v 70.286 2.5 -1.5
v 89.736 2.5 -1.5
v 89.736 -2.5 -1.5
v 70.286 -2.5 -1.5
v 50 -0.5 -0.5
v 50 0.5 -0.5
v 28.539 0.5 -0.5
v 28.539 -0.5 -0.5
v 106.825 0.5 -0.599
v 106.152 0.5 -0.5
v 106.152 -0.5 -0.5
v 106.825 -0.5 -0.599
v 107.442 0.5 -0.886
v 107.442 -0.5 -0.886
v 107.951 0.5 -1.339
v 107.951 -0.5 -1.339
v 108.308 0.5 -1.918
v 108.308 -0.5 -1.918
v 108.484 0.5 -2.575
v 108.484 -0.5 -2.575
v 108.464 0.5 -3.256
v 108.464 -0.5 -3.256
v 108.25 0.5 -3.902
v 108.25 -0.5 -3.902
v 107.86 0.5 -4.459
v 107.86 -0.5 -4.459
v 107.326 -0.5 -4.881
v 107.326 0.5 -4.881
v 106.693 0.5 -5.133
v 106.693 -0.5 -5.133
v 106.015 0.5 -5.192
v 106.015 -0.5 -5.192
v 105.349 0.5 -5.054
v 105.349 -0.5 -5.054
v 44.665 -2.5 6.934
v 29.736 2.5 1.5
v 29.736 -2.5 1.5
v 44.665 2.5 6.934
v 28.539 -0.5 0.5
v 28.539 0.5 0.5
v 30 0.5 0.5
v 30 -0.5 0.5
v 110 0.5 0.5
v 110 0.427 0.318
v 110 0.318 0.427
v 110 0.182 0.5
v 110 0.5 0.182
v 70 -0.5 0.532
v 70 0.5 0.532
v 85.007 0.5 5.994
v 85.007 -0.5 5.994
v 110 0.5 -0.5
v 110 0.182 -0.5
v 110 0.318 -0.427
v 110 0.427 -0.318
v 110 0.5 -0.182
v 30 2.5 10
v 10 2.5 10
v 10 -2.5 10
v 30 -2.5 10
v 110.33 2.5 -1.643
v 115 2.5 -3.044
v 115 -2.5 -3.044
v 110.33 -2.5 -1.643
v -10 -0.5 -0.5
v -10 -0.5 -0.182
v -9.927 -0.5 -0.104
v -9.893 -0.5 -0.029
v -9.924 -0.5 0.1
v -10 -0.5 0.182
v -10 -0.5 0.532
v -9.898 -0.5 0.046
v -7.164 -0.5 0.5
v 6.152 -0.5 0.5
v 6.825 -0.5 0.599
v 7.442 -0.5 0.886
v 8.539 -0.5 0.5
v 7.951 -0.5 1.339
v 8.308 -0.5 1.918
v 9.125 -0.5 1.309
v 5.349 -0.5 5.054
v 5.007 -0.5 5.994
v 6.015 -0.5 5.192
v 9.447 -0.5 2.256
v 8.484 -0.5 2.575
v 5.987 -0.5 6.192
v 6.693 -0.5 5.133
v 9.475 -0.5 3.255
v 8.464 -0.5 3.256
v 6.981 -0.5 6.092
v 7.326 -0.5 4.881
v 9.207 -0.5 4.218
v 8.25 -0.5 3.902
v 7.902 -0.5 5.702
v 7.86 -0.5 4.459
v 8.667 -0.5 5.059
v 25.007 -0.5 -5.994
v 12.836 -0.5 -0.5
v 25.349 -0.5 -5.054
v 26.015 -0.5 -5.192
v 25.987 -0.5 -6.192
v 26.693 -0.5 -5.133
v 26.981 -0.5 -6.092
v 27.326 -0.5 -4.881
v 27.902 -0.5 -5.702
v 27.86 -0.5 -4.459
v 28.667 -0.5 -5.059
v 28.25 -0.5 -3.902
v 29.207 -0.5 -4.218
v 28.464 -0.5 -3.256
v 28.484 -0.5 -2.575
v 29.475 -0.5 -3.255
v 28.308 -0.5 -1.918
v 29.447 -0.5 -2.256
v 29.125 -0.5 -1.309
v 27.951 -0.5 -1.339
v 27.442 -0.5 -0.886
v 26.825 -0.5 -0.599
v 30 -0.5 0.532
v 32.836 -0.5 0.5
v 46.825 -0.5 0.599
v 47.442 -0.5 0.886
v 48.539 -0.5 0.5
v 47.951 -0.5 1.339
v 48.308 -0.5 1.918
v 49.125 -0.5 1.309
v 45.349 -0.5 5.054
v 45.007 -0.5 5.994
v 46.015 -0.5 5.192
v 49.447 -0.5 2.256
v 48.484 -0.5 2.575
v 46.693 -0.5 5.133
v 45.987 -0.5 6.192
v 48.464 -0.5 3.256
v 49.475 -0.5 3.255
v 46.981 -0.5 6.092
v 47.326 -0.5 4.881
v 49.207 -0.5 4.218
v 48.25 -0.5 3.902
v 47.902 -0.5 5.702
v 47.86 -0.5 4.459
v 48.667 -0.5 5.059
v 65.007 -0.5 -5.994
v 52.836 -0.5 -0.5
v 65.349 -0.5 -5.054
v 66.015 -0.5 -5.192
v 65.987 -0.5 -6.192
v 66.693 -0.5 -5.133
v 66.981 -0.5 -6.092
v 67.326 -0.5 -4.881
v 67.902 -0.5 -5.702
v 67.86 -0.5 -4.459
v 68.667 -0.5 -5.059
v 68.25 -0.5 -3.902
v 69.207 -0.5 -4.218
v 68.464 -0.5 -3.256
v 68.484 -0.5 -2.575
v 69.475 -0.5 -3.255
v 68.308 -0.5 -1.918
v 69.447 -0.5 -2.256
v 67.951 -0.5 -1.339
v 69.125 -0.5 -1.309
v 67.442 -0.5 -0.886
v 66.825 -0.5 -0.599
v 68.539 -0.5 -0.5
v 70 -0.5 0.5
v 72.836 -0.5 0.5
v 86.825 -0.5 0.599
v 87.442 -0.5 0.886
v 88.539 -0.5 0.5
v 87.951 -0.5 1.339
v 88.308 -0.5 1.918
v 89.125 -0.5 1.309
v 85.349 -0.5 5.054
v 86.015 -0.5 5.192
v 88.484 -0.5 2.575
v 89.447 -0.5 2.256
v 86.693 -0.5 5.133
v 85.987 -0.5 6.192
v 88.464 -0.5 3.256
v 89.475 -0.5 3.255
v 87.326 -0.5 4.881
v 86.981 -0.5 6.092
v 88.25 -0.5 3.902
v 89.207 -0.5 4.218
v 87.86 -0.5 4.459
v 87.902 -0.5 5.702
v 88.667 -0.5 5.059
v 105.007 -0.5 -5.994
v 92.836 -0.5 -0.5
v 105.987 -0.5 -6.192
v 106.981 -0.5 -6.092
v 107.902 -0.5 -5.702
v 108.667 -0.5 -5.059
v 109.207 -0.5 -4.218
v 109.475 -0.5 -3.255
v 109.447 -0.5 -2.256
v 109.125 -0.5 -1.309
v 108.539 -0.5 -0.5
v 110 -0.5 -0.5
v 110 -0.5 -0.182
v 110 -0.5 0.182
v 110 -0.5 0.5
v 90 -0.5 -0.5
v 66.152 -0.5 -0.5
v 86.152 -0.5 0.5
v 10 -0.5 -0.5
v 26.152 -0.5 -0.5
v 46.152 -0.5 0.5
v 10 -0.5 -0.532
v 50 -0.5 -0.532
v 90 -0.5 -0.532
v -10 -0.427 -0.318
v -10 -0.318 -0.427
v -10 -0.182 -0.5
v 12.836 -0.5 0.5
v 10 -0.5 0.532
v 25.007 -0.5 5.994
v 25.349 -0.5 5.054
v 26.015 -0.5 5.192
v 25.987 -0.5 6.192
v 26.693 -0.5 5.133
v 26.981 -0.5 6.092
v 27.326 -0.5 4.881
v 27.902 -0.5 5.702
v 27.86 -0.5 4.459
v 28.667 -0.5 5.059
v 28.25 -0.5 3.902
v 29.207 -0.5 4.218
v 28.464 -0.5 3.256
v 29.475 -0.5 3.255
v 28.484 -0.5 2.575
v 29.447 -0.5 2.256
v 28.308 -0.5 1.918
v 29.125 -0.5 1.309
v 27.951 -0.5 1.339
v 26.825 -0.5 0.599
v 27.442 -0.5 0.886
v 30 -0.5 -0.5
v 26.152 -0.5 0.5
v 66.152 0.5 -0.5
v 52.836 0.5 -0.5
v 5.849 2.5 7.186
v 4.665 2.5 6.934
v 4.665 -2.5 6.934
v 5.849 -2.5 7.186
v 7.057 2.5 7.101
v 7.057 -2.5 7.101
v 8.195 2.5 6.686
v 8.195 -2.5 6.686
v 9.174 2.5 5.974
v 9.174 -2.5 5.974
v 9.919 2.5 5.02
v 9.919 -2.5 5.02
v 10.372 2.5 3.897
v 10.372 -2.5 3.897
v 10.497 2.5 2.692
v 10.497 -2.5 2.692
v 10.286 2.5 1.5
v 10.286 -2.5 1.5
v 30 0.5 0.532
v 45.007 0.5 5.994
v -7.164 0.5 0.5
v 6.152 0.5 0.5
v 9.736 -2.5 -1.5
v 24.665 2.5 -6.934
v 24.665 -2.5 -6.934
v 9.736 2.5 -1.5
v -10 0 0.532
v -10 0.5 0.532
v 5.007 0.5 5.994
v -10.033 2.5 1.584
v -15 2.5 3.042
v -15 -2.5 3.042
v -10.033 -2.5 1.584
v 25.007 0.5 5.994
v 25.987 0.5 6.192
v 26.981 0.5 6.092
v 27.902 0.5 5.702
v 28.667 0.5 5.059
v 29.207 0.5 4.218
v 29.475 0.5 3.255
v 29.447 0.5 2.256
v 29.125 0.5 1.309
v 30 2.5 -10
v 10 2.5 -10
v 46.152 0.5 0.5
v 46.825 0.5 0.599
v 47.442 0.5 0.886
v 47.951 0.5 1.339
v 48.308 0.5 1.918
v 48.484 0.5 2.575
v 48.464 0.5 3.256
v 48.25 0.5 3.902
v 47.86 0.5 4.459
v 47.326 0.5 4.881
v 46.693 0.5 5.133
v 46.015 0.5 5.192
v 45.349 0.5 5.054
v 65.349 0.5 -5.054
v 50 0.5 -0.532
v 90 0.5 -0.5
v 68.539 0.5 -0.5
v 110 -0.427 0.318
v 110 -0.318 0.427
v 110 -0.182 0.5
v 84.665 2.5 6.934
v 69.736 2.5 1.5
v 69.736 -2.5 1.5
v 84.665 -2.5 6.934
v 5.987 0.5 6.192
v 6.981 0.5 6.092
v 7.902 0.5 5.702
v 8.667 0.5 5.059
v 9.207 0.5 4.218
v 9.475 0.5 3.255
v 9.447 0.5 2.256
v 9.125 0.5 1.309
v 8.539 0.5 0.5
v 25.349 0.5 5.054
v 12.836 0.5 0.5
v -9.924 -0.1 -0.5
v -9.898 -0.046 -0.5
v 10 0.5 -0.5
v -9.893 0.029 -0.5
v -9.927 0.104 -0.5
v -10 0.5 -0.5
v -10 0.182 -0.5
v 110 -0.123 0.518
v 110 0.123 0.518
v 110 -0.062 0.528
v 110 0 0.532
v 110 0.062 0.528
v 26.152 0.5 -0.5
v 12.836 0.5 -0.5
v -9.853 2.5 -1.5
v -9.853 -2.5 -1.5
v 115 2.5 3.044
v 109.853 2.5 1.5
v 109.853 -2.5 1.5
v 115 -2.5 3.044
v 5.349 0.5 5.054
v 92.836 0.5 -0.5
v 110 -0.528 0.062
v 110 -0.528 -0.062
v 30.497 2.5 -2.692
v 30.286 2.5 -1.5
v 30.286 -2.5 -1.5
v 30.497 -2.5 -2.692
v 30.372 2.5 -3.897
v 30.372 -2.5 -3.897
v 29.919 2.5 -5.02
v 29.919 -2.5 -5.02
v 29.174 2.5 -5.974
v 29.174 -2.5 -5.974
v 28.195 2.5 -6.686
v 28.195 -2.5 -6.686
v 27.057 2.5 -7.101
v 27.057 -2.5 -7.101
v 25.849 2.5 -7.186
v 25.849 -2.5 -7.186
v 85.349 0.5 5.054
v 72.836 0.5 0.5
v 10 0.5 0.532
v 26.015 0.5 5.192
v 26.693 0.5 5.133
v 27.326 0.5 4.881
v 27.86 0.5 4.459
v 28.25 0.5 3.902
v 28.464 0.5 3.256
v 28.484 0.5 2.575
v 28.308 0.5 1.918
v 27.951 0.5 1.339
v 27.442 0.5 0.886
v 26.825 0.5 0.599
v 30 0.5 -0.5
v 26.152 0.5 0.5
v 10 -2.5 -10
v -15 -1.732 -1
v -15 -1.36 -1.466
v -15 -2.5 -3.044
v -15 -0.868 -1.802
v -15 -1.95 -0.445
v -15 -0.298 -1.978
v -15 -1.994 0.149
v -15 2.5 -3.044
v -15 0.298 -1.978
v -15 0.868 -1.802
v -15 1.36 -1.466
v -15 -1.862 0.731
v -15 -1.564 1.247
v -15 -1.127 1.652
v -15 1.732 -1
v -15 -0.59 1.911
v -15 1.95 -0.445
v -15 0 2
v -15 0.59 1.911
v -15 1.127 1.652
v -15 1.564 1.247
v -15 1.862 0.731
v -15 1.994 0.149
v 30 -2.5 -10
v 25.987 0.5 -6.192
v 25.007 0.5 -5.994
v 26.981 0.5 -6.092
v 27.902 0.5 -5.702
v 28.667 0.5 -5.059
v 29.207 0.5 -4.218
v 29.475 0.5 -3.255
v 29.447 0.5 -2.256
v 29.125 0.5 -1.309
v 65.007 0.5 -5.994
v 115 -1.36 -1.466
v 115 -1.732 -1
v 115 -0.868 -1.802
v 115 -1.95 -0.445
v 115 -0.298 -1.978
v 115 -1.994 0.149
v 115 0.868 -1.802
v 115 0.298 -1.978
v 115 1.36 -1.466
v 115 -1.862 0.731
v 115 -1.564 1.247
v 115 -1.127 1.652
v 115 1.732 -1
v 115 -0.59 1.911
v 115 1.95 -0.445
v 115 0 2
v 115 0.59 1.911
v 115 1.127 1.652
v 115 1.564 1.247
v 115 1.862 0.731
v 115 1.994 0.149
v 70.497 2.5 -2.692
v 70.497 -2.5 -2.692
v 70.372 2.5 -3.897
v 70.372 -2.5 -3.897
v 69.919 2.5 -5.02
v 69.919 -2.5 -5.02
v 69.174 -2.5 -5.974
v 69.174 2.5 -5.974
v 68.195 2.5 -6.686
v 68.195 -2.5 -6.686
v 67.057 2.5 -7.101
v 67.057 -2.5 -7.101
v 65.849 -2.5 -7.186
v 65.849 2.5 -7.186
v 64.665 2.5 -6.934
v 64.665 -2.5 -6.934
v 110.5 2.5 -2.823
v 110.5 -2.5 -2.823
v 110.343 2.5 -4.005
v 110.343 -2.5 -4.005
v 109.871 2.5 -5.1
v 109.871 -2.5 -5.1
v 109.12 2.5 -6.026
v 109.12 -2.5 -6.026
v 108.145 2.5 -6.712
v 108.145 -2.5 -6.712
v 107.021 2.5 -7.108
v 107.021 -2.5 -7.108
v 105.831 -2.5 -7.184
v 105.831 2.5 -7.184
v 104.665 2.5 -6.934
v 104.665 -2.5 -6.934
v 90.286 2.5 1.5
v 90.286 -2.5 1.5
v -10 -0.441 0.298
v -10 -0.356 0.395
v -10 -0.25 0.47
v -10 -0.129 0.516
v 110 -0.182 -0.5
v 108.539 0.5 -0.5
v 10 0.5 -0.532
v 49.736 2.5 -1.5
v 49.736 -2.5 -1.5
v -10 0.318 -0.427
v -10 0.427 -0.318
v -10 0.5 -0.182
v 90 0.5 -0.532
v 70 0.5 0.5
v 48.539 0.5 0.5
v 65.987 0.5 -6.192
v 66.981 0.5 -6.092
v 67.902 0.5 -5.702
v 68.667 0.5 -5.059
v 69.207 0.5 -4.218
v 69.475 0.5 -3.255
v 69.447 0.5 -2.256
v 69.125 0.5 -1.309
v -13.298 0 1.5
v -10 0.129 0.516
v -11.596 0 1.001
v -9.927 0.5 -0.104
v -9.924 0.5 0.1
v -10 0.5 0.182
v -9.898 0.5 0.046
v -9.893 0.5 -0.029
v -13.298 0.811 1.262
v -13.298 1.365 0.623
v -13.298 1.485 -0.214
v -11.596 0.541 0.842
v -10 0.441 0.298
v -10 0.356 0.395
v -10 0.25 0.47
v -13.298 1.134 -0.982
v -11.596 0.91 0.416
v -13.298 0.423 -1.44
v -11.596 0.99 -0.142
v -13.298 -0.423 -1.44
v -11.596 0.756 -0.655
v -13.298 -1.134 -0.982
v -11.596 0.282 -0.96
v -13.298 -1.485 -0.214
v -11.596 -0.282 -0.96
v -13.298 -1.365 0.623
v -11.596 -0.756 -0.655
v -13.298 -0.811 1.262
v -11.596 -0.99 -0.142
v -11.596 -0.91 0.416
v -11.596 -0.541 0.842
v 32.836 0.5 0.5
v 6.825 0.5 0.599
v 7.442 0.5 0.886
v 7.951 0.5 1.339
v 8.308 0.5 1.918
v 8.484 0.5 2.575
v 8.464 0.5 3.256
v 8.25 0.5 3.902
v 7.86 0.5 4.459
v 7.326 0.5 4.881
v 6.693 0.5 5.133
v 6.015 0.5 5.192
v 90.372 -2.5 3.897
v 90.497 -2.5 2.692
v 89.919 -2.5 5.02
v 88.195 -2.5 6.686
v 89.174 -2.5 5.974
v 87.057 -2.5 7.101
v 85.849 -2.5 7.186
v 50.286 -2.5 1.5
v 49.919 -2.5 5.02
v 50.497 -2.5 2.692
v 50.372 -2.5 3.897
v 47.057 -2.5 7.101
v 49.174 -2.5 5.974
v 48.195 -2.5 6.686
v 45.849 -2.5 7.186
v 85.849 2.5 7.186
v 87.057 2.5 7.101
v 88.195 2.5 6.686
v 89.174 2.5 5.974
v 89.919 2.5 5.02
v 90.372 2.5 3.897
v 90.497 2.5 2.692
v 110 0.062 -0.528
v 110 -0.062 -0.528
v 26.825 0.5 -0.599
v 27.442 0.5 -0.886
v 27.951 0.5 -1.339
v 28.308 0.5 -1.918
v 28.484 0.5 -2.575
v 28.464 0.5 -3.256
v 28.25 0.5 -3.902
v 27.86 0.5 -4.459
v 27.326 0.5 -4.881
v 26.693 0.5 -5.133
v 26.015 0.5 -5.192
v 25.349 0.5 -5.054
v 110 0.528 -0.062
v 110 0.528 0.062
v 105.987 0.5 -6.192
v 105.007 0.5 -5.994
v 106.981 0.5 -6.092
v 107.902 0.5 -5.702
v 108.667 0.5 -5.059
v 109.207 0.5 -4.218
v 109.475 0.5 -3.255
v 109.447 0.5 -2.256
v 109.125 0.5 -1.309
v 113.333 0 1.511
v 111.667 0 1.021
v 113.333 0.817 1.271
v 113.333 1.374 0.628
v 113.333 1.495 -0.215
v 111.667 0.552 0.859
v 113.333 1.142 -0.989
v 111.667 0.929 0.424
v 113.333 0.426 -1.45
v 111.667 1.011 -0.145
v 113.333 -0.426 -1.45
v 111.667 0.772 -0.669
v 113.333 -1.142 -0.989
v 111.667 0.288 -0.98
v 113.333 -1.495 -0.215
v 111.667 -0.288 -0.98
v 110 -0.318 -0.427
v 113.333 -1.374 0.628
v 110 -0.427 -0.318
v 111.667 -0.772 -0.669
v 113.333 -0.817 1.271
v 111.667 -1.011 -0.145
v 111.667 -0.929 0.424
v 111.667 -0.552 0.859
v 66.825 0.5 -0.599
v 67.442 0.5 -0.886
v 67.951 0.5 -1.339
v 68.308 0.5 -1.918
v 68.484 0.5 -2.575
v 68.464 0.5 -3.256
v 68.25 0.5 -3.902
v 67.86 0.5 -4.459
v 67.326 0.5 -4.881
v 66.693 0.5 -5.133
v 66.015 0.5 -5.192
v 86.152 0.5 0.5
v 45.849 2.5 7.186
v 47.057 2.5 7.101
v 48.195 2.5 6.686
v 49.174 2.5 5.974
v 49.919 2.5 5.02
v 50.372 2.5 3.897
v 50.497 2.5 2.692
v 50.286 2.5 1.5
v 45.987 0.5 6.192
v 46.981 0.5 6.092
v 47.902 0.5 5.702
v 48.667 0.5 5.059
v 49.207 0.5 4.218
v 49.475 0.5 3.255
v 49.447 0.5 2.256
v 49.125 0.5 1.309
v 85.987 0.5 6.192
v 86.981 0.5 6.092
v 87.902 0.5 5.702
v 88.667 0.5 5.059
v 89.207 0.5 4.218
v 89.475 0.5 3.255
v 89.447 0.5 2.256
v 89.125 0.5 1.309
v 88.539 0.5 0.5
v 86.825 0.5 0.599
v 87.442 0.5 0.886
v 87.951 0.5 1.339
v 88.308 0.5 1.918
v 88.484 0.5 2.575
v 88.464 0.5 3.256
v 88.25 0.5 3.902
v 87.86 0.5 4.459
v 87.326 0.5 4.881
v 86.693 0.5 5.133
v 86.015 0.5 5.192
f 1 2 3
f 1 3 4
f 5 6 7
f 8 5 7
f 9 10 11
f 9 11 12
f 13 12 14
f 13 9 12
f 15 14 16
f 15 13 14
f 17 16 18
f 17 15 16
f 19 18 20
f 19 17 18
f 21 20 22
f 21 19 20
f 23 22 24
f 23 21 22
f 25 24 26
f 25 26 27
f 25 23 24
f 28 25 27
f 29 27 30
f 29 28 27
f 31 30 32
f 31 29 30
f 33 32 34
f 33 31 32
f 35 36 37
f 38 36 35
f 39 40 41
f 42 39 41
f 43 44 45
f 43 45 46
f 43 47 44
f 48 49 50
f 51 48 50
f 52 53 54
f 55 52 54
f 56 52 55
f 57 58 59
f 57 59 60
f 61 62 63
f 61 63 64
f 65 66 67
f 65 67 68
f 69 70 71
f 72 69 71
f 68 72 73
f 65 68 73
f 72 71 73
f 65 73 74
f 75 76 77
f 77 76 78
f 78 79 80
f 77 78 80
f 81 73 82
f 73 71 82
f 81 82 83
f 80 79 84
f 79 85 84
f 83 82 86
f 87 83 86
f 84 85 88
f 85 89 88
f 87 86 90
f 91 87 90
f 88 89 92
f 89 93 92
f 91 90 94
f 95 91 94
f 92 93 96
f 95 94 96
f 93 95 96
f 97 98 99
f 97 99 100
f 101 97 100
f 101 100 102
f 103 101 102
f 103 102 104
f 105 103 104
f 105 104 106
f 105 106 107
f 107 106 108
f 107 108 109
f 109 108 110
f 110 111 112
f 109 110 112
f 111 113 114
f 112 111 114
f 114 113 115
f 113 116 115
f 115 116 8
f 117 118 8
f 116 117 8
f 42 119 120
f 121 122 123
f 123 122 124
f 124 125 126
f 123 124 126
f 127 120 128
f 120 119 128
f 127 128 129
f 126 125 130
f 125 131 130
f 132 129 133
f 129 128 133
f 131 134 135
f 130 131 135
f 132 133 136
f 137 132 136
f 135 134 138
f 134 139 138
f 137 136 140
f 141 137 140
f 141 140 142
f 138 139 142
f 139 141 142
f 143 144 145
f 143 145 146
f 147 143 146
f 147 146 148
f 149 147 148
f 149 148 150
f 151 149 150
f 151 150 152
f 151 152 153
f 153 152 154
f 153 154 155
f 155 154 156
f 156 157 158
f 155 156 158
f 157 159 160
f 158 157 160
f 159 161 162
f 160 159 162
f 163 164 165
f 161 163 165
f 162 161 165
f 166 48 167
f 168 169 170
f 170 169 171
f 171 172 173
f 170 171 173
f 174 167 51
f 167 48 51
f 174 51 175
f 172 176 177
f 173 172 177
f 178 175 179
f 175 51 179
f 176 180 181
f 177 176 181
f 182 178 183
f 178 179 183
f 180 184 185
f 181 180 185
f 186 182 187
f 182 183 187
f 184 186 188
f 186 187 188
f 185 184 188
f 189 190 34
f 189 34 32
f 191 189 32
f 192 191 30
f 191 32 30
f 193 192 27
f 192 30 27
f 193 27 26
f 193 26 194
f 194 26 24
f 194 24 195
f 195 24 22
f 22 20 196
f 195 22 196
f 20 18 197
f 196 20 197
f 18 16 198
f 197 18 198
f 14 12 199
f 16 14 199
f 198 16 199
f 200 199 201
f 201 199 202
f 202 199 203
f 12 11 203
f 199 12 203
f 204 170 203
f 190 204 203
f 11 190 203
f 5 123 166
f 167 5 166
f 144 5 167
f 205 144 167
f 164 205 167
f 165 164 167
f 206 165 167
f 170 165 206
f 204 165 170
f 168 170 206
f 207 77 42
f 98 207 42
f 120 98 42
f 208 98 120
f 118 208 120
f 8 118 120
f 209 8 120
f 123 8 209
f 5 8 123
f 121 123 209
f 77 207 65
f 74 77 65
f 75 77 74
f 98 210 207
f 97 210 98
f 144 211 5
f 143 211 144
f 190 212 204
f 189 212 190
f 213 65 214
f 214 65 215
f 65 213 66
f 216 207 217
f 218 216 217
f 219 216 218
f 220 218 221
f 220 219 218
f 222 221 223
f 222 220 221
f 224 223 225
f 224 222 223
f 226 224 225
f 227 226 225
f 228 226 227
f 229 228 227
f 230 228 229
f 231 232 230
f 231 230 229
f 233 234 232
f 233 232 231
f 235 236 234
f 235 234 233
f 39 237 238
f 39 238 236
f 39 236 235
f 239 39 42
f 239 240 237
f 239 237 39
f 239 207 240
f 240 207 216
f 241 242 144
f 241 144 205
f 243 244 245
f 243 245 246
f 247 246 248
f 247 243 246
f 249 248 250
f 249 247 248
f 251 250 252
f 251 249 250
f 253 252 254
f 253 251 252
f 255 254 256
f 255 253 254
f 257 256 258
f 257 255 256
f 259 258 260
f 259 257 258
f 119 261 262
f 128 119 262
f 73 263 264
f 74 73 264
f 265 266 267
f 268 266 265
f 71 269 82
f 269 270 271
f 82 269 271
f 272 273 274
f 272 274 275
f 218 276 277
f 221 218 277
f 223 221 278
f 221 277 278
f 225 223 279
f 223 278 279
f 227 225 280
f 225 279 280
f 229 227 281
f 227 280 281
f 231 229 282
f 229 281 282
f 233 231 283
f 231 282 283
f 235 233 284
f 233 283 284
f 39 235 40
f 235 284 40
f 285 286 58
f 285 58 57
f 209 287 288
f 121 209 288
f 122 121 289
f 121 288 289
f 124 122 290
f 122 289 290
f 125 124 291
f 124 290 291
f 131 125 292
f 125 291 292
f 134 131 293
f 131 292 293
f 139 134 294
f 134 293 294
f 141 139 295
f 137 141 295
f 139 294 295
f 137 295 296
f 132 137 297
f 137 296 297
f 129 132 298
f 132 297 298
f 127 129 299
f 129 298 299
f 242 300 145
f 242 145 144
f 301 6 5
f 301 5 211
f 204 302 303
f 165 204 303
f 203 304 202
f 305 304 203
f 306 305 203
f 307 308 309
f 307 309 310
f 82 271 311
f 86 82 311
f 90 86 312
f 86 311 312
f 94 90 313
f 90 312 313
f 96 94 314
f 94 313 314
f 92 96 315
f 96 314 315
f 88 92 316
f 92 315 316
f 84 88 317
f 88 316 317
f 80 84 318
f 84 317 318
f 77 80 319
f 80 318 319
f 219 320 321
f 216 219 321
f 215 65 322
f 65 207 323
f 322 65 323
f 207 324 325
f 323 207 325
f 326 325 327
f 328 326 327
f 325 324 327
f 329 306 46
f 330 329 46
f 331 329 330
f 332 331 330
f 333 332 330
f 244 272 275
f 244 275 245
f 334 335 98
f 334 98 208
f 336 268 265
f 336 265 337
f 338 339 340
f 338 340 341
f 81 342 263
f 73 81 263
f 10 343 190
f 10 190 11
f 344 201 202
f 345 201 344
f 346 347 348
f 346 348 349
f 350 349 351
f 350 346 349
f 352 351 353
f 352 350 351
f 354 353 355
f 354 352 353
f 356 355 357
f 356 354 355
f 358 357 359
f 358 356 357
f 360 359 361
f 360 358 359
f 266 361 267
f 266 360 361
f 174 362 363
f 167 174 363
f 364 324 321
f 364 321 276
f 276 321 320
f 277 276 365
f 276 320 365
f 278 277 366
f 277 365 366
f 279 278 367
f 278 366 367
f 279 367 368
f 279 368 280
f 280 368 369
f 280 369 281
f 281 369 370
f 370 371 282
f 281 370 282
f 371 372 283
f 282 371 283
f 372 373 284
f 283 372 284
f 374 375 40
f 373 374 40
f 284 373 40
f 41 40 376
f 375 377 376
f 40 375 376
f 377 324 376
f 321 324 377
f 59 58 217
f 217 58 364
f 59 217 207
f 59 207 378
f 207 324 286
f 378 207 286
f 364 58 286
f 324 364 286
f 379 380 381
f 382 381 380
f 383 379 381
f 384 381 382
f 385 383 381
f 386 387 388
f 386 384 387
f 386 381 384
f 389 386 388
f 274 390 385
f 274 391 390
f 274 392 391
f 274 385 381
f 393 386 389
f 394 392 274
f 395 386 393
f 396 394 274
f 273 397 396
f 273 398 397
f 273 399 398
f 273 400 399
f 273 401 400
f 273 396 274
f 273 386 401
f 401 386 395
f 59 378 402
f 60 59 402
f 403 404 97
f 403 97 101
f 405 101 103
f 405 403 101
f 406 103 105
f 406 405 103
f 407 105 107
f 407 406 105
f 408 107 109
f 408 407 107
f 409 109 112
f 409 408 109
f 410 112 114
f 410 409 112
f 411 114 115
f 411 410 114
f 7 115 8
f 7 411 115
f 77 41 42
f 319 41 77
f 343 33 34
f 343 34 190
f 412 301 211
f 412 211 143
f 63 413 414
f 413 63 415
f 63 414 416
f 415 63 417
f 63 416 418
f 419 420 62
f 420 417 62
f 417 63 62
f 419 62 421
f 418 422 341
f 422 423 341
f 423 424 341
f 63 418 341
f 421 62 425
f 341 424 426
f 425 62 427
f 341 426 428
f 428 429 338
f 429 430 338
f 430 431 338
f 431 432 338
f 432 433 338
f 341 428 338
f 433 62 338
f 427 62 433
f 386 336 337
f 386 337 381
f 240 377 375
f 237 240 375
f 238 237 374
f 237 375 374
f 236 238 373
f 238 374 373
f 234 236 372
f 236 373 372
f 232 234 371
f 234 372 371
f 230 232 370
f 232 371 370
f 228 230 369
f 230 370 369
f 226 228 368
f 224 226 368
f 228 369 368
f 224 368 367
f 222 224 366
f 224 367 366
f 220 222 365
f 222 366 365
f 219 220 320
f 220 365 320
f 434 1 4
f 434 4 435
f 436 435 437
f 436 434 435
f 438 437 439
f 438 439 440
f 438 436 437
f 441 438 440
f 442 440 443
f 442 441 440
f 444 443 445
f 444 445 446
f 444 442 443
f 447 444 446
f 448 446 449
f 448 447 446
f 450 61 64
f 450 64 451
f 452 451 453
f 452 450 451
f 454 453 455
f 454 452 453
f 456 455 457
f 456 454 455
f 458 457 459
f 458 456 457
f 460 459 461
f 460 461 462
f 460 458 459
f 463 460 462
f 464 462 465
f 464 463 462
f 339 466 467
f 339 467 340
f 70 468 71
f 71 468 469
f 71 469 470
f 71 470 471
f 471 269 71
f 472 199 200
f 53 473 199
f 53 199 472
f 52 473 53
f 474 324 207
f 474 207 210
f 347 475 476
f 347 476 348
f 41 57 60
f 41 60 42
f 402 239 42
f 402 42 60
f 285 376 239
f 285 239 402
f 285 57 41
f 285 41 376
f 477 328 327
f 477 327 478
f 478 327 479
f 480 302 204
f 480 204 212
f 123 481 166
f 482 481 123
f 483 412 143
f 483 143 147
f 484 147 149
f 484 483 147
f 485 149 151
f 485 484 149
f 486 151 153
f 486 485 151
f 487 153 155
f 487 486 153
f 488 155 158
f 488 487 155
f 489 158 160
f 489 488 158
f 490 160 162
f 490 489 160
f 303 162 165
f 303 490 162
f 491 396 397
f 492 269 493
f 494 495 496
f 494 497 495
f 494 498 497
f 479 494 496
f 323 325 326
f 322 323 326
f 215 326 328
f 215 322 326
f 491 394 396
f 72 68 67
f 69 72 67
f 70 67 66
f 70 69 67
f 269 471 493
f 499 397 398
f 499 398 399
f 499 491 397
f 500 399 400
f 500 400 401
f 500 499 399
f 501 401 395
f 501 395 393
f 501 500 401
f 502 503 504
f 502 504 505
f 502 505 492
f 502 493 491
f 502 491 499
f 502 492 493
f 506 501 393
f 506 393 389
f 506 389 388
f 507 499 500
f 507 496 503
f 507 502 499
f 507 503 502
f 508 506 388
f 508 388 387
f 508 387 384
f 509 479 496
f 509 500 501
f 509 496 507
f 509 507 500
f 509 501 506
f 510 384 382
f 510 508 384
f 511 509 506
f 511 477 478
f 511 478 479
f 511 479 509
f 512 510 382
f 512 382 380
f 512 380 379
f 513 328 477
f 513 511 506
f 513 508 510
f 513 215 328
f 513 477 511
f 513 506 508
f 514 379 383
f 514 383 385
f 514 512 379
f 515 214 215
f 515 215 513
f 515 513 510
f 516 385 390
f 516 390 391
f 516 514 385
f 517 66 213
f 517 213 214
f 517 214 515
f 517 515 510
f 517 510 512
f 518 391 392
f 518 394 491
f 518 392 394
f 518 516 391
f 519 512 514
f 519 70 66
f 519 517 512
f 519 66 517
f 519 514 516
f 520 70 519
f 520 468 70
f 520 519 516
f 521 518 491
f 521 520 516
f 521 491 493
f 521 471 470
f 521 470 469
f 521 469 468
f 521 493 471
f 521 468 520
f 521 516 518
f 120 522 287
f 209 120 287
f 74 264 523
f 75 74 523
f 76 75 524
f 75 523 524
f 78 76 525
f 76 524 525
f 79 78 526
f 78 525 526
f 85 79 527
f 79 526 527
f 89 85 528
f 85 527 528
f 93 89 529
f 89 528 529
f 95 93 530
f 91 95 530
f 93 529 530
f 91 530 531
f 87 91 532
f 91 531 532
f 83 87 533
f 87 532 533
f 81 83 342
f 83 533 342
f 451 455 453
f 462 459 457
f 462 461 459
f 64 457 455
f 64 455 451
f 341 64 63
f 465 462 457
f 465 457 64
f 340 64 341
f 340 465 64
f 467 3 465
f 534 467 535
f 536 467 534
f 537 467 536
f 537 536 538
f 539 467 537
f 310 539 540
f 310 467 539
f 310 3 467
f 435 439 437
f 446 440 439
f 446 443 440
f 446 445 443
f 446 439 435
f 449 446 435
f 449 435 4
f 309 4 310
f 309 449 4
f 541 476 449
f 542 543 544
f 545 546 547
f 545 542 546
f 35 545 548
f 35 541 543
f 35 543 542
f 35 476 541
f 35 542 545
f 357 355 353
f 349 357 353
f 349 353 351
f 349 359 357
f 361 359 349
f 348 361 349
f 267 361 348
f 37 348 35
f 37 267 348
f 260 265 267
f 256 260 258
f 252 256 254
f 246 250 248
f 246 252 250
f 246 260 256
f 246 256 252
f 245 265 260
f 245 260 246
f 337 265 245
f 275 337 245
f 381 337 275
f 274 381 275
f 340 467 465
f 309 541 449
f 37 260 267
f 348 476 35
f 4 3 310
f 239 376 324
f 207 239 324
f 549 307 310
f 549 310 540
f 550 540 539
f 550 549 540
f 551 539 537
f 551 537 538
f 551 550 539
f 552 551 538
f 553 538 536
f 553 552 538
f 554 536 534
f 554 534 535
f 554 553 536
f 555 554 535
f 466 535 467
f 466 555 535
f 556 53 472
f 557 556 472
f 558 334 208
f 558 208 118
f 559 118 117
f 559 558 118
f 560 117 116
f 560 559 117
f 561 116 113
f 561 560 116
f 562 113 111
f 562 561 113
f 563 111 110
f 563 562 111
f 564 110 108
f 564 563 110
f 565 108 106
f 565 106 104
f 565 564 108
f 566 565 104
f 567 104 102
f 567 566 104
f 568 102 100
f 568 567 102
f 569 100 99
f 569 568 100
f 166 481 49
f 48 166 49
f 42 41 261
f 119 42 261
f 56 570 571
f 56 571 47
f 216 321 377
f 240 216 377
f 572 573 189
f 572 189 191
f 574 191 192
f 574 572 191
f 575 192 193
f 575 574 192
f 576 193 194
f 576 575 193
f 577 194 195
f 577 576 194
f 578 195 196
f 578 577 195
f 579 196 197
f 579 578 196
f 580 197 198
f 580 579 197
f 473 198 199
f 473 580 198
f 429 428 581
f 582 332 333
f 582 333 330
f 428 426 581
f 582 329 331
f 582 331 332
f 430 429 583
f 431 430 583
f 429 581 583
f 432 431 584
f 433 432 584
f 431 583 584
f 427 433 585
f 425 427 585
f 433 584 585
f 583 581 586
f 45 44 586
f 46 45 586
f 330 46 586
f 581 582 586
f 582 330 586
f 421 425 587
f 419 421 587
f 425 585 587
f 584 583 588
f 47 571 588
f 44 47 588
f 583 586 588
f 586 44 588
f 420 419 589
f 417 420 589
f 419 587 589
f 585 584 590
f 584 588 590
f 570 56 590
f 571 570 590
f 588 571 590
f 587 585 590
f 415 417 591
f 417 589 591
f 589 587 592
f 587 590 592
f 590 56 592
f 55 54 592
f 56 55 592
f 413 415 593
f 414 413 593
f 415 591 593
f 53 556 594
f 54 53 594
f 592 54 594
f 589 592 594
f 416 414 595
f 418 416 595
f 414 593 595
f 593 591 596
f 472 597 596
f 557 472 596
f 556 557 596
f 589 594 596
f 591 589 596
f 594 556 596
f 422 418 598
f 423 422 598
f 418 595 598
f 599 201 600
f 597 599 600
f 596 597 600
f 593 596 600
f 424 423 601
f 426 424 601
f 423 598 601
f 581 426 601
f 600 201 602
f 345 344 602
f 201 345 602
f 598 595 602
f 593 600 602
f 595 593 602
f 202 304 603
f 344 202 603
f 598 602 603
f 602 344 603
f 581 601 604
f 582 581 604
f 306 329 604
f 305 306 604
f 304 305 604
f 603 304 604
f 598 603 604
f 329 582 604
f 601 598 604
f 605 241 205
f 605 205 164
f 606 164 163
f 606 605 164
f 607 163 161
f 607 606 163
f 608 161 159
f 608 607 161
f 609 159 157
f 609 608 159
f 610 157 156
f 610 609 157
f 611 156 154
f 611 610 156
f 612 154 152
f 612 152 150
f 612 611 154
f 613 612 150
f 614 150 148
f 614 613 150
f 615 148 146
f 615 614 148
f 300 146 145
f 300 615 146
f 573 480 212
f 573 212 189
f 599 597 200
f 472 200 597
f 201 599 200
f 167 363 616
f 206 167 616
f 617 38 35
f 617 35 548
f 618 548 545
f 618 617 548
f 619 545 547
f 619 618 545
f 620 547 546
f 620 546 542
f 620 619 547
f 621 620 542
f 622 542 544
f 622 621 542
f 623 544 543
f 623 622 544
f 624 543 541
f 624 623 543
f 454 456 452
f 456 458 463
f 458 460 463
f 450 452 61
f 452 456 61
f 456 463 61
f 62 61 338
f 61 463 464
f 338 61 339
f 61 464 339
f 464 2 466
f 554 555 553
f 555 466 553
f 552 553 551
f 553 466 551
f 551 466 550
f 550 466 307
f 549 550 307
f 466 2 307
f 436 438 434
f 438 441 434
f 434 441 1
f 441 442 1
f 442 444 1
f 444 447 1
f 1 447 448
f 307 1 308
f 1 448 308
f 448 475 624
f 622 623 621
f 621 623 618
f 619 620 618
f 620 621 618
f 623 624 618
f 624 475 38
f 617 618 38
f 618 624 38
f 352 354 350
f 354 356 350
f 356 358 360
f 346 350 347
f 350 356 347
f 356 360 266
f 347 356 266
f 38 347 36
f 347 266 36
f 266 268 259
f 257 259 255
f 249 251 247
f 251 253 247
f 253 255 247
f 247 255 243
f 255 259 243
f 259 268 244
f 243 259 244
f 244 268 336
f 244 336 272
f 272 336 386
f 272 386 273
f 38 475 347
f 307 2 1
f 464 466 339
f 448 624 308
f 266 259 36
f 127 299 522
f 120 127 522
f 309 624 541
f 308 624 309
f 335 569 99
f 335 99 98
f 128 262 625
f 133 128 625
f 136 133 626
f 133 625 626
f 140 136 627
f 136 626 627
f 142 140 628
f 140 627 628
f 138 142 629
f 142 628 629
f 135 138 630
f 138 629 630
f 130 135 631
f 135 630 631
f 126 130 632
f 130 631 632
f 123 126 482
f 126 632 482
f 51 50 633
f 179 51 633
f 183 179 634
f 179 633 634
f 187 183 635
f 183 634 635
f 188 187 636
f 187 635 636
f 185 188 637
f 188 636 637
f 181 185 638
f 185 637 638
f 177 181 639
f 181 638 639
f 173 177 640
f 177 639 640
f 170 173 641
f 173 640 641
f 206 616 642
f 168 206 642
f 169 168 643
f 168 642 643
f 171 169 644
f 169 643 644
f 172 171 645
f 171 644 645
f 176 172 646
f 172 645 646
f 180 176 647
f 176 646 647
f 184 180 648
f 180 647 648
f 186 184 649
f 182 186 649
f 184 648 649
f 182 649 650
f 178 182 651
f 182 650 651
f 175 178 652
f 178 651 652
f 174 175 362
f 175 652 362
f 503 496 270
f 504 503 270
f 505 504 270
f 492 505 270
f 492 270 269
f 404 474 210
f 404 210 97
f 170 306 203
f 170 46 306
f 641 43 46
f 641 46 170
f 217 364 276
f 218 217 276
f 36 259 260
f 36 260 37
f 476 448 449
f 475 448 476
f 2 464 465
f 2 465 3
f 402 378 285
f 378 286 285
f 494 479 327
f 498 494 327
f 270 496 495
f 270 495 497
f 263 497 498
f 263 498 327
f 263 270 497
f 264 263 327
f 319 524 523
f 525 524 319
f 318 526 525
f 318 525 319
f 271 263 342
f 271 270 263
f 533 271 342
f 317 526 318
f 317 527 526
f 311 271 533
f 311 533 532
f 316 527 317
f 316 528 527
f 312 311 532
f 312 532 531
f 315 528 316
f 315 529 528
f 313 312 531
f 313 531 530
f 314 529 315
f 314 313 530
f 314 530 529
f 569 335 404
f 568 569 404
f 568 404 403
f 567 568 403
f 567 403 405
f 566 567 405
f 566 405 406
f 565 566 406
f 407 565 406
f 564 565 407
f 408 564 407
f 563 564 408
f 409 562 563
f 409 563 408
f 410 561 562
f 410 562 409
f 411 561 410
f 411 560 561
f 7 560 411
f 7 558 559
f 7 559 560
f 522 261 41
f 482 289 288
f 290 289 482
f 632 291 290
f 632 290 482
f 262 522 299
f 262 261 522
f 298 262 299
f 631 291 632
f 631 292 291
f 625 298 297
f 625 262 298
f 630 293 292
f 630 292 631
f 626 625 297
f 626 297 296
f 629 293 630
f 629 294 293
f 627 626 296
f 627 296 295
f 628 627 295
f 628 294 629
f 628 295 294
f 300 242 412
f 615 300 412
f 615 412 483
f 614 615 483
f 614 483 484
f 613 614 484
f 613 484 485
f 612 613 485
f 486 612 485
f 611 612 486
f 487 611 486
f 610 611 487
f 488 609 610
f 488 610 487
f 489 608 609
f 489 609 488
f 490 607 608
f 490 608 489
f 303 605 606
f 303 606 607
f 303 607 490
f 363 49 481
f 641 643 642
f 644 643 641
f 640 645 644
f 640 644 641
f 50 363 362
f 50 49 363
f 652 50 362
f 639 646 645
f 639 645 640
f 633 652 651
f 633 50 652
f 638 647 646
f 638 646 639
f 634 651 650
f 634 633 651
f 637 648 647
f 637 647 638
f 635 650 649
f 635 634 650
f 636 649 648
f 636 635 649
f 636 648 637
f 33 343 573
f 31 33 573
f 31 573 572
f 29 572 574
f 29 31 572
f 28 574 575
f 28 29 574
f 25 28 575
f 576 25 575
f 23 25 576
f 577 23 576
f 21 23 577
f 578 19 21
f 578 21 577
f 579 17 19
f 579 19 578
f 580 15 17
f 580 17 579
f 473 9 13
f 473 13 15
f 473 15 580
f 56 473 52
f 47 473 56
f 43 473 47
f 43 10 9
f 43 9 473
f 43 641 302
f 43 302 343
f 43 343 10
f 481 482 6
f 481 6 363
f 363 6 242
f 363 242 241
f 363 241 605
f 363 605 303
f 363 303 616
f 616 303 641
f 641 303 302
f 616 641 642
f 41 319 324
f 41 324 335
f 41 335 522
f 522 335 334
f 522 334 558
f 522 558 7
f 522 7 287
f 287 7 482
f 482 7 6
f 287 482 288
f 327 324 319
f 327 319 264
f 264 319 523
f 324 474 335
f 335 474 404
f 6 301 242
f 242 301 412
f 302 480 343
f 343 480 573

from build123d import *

# Parameters (mm, degrees)
SKETCH3_W               = 20
SKETCH3_H               = 20
BOSS_EXTRUDE2_DEPTH     = 2.5
CUT_EXTRUDE_THIN2_DEPTH = 0.5
CUT_EXTRUDE_THIN4_DEPTH = 0.5
LPATTERN1_COUNT         = 2
LPATTERN1_PITCH         = 20
LPATTERN2_COUNT         = 3
LPATTERN2_PITCH         = 40
SKETCH7_W               = 20
SKETCH7_H               = 5
BOSS_EXTRUDE3_DEPTH     = 5
SKETCH9_W               = 130
SKETCH9_H               = 20
CUT_EXTRUDE1_DEPTH      = 1
CUT_EXTRUDE1_DEPTH_BACK = 6


with BuildPart() as part:
    # Sketch3 → Boss-Extrude2 (new body, symmetric)
    with BuildSketch(Plane(origin=(0, 0, 0), x_dir=(1, 0, 0), z_dir=(0, 1, 0))):
        Rectangle(SKETCH3_W, SKETCH3_H)
    extrude(amount=BOSS_EXTRUDE2_DEPTH, both=True)

    # Sketch6 → Cut-Extrude-Thin2 (cut, symmetric)
    with BuildSketch(Plane(origin=(0, 0, 0), x_dir=(1, 0, 0), z_dir=(0, 1, 0))):
        Polygon((-10, -0.5), (0, -0.5), (10, -0.5), (10, 0.5), (0, 0.5), (-10, 0.5), align=None)
    extrude(amount=CUT_EXTRUDE_THIN2_DEPTH, both=True, mode=Mode.SUBTRACT)

    # Sketch4 → Cut-Extrude-Thin4 (cut, symmetric)
    with BuildSketch(Plane(origin=(0, 0, 0), x_dir=(1, 0, 0), z_dir=(0, 1, 0))):
        with BuildLine():
            Line((-10.171010072, -0.46984631), (5.006878464, -5.994145956))
            ThreePointArc((5.006878464, -5.994145956), (9.449135926, -3.429407415), (6.151971613, 0.5))
            Line((6.151971613, 0.5), (6.151971613, -0.5))
            ThreePointArc((6.151971613, -0.5), (8.464328173, -3.255759238), (5.348898608, -5.054453336))
            Line((5.348898608, -5.054453336), (-9.828989928, 0.46984631))
            Line((-9.828989928, 0.46984631), (-10.171010072, -0.46984631))
        make_face()
    extrude(amount=CUT_EXTRUDE_THIN4_DEPTH, both=True, mode=Mode.SUBTRACT)


with BuildPart() as lpattern1_1:
    # LPattern1: pattern copy
    add(part.part.moved(Location(Vector(1, 0, 0) * (1 * LPATTERN1_PITCH))))


with BuildPart() as body_3:
    # Mirror1: mirrored copy
    add(lpattern1_1.part.mirror(Plane.XY))


with BuildPart() as part_1:
    add(part.part)

    # Combine1: union body 3
    add(body_3.part)


with BuildPart() as lpattern2_1:
    # LPattern2: pattern copy
    add(part_1.part.moved(Location(Vector(1, 0, 0) * (1 * LPATTERN2_PITCH))))


with BuildPart() as lpattern2_2:
    # LPattern2: pattern copy
    add(part_1.part.moved(Location(Vector(1, 0, 0) * (2 * LPATTERN2_PITCH))))


with BuildPart() as part_2:
    add(part_1.part)

    # Combine2: union LPattern2_1, LPattern2_2
    add(lpattern2_1.part)
    add(lpattern2_2.part)


with BuildPart() as body_3_2:
    # Sketch7 → Boss-Extrude3 (new body)
    with BuildSketch(Plane.ZY.offset(10)):
        Rectangle(SKETCH7_W, SKETCH7_H)
    extrude(amount=BOSS_EXTRUDE3_DEPTH)


with BuildPart() as cut_revolve2_tool:
    # Sketch8 → Cut-Revolve2 (revolve)
    with BuildSketch(Plane(origin=(0, 0, 0), x_dir=(1, 0, 0), z_dir=(0, 1, 0))):
        Polygon((-8.187598414, 0), (-15, 0), (-15, -2), align=None)
    revolve(axis=Axis((-8.187598414, 0, 0), (-1, 0, 0)))


with BuildPart() as part_3:
    add(part_2.part)

    # Cut-Revolve2: cut by cut_revolve2_tool
    add(cut_revolve2_tool.part, mode=Mode.SUBTRACT)


with BuildPart() as body_3_2_1:
    add(body_3_2.part)

    # Cut-Revolve2: cut by cut_revolve2_tool
    add(cut_revolve2_tool.part, mode=Mode.SUBTRACT)


with BuildPart() as body_4:
    # Mirror2: mirrored copy
    add(body_3_2_1.part.mirror(Plane.ZY.offset(-50)))


with BuildPart() as body_3_2_2:
    add(body_3_2_1.part)

    # Combine3: union part, body 4
    add(part_3.part)
    add(body_4.part)

    # Sketch9 → Cut-Extrude1 (cut, two sides)
    with BuildSketch(Plane(origin=(0, 2.5, 0), x_dir=(1, 0, 0), z_dir=(0, 1, 0))) as cut_extrude1_sk:
        with Locations((50, 0)):
            Rectangle(SKETCH9_W, SKETCH9_H)
        with BuildLine():
            Line((104.664858321, 6.933838577), (89.735509529, 1.5))
            Line((89.735509529, 1.5), (70.285755633, 1.5))
            ThreePointArc((70.285755633, 1.5), (69.174034965, 5.974125626), (64.664858321, 6.933838577))
            Line((64.664858321, 6.933838577), (49.735509529, 1.5))
            Line((49.735509529, 1.5), (30.285755633, 1.5))
            ThreePointArc((30.285755633, 1.5), (29.174034965, 5.974125626), (24.664858321, 6.933838577))
            Line((24.664858321, 6.933838577), (9.735509529, 1.5))
            Line((9.735509529, 1.5), (-9.853231164, 1.5))
            Line((-9.853231164, 1.5), (-16, 3.344030651))
            Line((-16, 3.344030651), (-16, -3.335786867))
            Line((-16, -3.335786867), (-10.03341654, -1.584104033))
            Line((-10.03341654, -1.584104033), (4.664858321, -6.933838577))
            ThreePointArc((4.664858321, -6.933838577), (9.174034965, -5.974125626), (10.285755633, -1.5))
            Line((10.285755633, -1.5), (29.735509529, -1.5))
            Line((29.735509529, -1.5), (44.664858321, -6.933838577))
            ThreePointArc((44.664858321, -6.933838577), (49.174034965, -5.974125626), (50.285755633, -1.5))
            Line((50.285755633, -1.5), (69.735509529, -1.5))
            Line((69.735509529, -1.5), (84.664858321, -6.933838577))
            ThreePointArc((84.664858321, -6.933838577), (89.174034965, -5.974125626), (90.285755633, -1.5))
            Line((90.285755633, -1.5), (109.853231164, -1.5))
            Line((109.853231164, -1.5), (116, -3.344030651))
            Line((116, -3.344030651), (116, 3.344030651))
            Line((116, 3.344030651), (110.329660684, 1.642928856))
            ThreePointArc((110.329660684, 1.642928856), (109.119838006, 6.025624952), (104.664858321, 6.933838577))
        make_face(mode=Mode.SUBTRACT)
    extrude(amount=CUT_EXTRUDE1_DEPTH, mode=Mode.SUBTRACT)
    extrude(cut_extrude1_sk.sketch, amount=-CUT_EXTRUDE1_DEPTH_BACK, mode=Mode.SUBTRACT)


solid = Compound([lpattern1_1.part, body_3_2_2.part])
